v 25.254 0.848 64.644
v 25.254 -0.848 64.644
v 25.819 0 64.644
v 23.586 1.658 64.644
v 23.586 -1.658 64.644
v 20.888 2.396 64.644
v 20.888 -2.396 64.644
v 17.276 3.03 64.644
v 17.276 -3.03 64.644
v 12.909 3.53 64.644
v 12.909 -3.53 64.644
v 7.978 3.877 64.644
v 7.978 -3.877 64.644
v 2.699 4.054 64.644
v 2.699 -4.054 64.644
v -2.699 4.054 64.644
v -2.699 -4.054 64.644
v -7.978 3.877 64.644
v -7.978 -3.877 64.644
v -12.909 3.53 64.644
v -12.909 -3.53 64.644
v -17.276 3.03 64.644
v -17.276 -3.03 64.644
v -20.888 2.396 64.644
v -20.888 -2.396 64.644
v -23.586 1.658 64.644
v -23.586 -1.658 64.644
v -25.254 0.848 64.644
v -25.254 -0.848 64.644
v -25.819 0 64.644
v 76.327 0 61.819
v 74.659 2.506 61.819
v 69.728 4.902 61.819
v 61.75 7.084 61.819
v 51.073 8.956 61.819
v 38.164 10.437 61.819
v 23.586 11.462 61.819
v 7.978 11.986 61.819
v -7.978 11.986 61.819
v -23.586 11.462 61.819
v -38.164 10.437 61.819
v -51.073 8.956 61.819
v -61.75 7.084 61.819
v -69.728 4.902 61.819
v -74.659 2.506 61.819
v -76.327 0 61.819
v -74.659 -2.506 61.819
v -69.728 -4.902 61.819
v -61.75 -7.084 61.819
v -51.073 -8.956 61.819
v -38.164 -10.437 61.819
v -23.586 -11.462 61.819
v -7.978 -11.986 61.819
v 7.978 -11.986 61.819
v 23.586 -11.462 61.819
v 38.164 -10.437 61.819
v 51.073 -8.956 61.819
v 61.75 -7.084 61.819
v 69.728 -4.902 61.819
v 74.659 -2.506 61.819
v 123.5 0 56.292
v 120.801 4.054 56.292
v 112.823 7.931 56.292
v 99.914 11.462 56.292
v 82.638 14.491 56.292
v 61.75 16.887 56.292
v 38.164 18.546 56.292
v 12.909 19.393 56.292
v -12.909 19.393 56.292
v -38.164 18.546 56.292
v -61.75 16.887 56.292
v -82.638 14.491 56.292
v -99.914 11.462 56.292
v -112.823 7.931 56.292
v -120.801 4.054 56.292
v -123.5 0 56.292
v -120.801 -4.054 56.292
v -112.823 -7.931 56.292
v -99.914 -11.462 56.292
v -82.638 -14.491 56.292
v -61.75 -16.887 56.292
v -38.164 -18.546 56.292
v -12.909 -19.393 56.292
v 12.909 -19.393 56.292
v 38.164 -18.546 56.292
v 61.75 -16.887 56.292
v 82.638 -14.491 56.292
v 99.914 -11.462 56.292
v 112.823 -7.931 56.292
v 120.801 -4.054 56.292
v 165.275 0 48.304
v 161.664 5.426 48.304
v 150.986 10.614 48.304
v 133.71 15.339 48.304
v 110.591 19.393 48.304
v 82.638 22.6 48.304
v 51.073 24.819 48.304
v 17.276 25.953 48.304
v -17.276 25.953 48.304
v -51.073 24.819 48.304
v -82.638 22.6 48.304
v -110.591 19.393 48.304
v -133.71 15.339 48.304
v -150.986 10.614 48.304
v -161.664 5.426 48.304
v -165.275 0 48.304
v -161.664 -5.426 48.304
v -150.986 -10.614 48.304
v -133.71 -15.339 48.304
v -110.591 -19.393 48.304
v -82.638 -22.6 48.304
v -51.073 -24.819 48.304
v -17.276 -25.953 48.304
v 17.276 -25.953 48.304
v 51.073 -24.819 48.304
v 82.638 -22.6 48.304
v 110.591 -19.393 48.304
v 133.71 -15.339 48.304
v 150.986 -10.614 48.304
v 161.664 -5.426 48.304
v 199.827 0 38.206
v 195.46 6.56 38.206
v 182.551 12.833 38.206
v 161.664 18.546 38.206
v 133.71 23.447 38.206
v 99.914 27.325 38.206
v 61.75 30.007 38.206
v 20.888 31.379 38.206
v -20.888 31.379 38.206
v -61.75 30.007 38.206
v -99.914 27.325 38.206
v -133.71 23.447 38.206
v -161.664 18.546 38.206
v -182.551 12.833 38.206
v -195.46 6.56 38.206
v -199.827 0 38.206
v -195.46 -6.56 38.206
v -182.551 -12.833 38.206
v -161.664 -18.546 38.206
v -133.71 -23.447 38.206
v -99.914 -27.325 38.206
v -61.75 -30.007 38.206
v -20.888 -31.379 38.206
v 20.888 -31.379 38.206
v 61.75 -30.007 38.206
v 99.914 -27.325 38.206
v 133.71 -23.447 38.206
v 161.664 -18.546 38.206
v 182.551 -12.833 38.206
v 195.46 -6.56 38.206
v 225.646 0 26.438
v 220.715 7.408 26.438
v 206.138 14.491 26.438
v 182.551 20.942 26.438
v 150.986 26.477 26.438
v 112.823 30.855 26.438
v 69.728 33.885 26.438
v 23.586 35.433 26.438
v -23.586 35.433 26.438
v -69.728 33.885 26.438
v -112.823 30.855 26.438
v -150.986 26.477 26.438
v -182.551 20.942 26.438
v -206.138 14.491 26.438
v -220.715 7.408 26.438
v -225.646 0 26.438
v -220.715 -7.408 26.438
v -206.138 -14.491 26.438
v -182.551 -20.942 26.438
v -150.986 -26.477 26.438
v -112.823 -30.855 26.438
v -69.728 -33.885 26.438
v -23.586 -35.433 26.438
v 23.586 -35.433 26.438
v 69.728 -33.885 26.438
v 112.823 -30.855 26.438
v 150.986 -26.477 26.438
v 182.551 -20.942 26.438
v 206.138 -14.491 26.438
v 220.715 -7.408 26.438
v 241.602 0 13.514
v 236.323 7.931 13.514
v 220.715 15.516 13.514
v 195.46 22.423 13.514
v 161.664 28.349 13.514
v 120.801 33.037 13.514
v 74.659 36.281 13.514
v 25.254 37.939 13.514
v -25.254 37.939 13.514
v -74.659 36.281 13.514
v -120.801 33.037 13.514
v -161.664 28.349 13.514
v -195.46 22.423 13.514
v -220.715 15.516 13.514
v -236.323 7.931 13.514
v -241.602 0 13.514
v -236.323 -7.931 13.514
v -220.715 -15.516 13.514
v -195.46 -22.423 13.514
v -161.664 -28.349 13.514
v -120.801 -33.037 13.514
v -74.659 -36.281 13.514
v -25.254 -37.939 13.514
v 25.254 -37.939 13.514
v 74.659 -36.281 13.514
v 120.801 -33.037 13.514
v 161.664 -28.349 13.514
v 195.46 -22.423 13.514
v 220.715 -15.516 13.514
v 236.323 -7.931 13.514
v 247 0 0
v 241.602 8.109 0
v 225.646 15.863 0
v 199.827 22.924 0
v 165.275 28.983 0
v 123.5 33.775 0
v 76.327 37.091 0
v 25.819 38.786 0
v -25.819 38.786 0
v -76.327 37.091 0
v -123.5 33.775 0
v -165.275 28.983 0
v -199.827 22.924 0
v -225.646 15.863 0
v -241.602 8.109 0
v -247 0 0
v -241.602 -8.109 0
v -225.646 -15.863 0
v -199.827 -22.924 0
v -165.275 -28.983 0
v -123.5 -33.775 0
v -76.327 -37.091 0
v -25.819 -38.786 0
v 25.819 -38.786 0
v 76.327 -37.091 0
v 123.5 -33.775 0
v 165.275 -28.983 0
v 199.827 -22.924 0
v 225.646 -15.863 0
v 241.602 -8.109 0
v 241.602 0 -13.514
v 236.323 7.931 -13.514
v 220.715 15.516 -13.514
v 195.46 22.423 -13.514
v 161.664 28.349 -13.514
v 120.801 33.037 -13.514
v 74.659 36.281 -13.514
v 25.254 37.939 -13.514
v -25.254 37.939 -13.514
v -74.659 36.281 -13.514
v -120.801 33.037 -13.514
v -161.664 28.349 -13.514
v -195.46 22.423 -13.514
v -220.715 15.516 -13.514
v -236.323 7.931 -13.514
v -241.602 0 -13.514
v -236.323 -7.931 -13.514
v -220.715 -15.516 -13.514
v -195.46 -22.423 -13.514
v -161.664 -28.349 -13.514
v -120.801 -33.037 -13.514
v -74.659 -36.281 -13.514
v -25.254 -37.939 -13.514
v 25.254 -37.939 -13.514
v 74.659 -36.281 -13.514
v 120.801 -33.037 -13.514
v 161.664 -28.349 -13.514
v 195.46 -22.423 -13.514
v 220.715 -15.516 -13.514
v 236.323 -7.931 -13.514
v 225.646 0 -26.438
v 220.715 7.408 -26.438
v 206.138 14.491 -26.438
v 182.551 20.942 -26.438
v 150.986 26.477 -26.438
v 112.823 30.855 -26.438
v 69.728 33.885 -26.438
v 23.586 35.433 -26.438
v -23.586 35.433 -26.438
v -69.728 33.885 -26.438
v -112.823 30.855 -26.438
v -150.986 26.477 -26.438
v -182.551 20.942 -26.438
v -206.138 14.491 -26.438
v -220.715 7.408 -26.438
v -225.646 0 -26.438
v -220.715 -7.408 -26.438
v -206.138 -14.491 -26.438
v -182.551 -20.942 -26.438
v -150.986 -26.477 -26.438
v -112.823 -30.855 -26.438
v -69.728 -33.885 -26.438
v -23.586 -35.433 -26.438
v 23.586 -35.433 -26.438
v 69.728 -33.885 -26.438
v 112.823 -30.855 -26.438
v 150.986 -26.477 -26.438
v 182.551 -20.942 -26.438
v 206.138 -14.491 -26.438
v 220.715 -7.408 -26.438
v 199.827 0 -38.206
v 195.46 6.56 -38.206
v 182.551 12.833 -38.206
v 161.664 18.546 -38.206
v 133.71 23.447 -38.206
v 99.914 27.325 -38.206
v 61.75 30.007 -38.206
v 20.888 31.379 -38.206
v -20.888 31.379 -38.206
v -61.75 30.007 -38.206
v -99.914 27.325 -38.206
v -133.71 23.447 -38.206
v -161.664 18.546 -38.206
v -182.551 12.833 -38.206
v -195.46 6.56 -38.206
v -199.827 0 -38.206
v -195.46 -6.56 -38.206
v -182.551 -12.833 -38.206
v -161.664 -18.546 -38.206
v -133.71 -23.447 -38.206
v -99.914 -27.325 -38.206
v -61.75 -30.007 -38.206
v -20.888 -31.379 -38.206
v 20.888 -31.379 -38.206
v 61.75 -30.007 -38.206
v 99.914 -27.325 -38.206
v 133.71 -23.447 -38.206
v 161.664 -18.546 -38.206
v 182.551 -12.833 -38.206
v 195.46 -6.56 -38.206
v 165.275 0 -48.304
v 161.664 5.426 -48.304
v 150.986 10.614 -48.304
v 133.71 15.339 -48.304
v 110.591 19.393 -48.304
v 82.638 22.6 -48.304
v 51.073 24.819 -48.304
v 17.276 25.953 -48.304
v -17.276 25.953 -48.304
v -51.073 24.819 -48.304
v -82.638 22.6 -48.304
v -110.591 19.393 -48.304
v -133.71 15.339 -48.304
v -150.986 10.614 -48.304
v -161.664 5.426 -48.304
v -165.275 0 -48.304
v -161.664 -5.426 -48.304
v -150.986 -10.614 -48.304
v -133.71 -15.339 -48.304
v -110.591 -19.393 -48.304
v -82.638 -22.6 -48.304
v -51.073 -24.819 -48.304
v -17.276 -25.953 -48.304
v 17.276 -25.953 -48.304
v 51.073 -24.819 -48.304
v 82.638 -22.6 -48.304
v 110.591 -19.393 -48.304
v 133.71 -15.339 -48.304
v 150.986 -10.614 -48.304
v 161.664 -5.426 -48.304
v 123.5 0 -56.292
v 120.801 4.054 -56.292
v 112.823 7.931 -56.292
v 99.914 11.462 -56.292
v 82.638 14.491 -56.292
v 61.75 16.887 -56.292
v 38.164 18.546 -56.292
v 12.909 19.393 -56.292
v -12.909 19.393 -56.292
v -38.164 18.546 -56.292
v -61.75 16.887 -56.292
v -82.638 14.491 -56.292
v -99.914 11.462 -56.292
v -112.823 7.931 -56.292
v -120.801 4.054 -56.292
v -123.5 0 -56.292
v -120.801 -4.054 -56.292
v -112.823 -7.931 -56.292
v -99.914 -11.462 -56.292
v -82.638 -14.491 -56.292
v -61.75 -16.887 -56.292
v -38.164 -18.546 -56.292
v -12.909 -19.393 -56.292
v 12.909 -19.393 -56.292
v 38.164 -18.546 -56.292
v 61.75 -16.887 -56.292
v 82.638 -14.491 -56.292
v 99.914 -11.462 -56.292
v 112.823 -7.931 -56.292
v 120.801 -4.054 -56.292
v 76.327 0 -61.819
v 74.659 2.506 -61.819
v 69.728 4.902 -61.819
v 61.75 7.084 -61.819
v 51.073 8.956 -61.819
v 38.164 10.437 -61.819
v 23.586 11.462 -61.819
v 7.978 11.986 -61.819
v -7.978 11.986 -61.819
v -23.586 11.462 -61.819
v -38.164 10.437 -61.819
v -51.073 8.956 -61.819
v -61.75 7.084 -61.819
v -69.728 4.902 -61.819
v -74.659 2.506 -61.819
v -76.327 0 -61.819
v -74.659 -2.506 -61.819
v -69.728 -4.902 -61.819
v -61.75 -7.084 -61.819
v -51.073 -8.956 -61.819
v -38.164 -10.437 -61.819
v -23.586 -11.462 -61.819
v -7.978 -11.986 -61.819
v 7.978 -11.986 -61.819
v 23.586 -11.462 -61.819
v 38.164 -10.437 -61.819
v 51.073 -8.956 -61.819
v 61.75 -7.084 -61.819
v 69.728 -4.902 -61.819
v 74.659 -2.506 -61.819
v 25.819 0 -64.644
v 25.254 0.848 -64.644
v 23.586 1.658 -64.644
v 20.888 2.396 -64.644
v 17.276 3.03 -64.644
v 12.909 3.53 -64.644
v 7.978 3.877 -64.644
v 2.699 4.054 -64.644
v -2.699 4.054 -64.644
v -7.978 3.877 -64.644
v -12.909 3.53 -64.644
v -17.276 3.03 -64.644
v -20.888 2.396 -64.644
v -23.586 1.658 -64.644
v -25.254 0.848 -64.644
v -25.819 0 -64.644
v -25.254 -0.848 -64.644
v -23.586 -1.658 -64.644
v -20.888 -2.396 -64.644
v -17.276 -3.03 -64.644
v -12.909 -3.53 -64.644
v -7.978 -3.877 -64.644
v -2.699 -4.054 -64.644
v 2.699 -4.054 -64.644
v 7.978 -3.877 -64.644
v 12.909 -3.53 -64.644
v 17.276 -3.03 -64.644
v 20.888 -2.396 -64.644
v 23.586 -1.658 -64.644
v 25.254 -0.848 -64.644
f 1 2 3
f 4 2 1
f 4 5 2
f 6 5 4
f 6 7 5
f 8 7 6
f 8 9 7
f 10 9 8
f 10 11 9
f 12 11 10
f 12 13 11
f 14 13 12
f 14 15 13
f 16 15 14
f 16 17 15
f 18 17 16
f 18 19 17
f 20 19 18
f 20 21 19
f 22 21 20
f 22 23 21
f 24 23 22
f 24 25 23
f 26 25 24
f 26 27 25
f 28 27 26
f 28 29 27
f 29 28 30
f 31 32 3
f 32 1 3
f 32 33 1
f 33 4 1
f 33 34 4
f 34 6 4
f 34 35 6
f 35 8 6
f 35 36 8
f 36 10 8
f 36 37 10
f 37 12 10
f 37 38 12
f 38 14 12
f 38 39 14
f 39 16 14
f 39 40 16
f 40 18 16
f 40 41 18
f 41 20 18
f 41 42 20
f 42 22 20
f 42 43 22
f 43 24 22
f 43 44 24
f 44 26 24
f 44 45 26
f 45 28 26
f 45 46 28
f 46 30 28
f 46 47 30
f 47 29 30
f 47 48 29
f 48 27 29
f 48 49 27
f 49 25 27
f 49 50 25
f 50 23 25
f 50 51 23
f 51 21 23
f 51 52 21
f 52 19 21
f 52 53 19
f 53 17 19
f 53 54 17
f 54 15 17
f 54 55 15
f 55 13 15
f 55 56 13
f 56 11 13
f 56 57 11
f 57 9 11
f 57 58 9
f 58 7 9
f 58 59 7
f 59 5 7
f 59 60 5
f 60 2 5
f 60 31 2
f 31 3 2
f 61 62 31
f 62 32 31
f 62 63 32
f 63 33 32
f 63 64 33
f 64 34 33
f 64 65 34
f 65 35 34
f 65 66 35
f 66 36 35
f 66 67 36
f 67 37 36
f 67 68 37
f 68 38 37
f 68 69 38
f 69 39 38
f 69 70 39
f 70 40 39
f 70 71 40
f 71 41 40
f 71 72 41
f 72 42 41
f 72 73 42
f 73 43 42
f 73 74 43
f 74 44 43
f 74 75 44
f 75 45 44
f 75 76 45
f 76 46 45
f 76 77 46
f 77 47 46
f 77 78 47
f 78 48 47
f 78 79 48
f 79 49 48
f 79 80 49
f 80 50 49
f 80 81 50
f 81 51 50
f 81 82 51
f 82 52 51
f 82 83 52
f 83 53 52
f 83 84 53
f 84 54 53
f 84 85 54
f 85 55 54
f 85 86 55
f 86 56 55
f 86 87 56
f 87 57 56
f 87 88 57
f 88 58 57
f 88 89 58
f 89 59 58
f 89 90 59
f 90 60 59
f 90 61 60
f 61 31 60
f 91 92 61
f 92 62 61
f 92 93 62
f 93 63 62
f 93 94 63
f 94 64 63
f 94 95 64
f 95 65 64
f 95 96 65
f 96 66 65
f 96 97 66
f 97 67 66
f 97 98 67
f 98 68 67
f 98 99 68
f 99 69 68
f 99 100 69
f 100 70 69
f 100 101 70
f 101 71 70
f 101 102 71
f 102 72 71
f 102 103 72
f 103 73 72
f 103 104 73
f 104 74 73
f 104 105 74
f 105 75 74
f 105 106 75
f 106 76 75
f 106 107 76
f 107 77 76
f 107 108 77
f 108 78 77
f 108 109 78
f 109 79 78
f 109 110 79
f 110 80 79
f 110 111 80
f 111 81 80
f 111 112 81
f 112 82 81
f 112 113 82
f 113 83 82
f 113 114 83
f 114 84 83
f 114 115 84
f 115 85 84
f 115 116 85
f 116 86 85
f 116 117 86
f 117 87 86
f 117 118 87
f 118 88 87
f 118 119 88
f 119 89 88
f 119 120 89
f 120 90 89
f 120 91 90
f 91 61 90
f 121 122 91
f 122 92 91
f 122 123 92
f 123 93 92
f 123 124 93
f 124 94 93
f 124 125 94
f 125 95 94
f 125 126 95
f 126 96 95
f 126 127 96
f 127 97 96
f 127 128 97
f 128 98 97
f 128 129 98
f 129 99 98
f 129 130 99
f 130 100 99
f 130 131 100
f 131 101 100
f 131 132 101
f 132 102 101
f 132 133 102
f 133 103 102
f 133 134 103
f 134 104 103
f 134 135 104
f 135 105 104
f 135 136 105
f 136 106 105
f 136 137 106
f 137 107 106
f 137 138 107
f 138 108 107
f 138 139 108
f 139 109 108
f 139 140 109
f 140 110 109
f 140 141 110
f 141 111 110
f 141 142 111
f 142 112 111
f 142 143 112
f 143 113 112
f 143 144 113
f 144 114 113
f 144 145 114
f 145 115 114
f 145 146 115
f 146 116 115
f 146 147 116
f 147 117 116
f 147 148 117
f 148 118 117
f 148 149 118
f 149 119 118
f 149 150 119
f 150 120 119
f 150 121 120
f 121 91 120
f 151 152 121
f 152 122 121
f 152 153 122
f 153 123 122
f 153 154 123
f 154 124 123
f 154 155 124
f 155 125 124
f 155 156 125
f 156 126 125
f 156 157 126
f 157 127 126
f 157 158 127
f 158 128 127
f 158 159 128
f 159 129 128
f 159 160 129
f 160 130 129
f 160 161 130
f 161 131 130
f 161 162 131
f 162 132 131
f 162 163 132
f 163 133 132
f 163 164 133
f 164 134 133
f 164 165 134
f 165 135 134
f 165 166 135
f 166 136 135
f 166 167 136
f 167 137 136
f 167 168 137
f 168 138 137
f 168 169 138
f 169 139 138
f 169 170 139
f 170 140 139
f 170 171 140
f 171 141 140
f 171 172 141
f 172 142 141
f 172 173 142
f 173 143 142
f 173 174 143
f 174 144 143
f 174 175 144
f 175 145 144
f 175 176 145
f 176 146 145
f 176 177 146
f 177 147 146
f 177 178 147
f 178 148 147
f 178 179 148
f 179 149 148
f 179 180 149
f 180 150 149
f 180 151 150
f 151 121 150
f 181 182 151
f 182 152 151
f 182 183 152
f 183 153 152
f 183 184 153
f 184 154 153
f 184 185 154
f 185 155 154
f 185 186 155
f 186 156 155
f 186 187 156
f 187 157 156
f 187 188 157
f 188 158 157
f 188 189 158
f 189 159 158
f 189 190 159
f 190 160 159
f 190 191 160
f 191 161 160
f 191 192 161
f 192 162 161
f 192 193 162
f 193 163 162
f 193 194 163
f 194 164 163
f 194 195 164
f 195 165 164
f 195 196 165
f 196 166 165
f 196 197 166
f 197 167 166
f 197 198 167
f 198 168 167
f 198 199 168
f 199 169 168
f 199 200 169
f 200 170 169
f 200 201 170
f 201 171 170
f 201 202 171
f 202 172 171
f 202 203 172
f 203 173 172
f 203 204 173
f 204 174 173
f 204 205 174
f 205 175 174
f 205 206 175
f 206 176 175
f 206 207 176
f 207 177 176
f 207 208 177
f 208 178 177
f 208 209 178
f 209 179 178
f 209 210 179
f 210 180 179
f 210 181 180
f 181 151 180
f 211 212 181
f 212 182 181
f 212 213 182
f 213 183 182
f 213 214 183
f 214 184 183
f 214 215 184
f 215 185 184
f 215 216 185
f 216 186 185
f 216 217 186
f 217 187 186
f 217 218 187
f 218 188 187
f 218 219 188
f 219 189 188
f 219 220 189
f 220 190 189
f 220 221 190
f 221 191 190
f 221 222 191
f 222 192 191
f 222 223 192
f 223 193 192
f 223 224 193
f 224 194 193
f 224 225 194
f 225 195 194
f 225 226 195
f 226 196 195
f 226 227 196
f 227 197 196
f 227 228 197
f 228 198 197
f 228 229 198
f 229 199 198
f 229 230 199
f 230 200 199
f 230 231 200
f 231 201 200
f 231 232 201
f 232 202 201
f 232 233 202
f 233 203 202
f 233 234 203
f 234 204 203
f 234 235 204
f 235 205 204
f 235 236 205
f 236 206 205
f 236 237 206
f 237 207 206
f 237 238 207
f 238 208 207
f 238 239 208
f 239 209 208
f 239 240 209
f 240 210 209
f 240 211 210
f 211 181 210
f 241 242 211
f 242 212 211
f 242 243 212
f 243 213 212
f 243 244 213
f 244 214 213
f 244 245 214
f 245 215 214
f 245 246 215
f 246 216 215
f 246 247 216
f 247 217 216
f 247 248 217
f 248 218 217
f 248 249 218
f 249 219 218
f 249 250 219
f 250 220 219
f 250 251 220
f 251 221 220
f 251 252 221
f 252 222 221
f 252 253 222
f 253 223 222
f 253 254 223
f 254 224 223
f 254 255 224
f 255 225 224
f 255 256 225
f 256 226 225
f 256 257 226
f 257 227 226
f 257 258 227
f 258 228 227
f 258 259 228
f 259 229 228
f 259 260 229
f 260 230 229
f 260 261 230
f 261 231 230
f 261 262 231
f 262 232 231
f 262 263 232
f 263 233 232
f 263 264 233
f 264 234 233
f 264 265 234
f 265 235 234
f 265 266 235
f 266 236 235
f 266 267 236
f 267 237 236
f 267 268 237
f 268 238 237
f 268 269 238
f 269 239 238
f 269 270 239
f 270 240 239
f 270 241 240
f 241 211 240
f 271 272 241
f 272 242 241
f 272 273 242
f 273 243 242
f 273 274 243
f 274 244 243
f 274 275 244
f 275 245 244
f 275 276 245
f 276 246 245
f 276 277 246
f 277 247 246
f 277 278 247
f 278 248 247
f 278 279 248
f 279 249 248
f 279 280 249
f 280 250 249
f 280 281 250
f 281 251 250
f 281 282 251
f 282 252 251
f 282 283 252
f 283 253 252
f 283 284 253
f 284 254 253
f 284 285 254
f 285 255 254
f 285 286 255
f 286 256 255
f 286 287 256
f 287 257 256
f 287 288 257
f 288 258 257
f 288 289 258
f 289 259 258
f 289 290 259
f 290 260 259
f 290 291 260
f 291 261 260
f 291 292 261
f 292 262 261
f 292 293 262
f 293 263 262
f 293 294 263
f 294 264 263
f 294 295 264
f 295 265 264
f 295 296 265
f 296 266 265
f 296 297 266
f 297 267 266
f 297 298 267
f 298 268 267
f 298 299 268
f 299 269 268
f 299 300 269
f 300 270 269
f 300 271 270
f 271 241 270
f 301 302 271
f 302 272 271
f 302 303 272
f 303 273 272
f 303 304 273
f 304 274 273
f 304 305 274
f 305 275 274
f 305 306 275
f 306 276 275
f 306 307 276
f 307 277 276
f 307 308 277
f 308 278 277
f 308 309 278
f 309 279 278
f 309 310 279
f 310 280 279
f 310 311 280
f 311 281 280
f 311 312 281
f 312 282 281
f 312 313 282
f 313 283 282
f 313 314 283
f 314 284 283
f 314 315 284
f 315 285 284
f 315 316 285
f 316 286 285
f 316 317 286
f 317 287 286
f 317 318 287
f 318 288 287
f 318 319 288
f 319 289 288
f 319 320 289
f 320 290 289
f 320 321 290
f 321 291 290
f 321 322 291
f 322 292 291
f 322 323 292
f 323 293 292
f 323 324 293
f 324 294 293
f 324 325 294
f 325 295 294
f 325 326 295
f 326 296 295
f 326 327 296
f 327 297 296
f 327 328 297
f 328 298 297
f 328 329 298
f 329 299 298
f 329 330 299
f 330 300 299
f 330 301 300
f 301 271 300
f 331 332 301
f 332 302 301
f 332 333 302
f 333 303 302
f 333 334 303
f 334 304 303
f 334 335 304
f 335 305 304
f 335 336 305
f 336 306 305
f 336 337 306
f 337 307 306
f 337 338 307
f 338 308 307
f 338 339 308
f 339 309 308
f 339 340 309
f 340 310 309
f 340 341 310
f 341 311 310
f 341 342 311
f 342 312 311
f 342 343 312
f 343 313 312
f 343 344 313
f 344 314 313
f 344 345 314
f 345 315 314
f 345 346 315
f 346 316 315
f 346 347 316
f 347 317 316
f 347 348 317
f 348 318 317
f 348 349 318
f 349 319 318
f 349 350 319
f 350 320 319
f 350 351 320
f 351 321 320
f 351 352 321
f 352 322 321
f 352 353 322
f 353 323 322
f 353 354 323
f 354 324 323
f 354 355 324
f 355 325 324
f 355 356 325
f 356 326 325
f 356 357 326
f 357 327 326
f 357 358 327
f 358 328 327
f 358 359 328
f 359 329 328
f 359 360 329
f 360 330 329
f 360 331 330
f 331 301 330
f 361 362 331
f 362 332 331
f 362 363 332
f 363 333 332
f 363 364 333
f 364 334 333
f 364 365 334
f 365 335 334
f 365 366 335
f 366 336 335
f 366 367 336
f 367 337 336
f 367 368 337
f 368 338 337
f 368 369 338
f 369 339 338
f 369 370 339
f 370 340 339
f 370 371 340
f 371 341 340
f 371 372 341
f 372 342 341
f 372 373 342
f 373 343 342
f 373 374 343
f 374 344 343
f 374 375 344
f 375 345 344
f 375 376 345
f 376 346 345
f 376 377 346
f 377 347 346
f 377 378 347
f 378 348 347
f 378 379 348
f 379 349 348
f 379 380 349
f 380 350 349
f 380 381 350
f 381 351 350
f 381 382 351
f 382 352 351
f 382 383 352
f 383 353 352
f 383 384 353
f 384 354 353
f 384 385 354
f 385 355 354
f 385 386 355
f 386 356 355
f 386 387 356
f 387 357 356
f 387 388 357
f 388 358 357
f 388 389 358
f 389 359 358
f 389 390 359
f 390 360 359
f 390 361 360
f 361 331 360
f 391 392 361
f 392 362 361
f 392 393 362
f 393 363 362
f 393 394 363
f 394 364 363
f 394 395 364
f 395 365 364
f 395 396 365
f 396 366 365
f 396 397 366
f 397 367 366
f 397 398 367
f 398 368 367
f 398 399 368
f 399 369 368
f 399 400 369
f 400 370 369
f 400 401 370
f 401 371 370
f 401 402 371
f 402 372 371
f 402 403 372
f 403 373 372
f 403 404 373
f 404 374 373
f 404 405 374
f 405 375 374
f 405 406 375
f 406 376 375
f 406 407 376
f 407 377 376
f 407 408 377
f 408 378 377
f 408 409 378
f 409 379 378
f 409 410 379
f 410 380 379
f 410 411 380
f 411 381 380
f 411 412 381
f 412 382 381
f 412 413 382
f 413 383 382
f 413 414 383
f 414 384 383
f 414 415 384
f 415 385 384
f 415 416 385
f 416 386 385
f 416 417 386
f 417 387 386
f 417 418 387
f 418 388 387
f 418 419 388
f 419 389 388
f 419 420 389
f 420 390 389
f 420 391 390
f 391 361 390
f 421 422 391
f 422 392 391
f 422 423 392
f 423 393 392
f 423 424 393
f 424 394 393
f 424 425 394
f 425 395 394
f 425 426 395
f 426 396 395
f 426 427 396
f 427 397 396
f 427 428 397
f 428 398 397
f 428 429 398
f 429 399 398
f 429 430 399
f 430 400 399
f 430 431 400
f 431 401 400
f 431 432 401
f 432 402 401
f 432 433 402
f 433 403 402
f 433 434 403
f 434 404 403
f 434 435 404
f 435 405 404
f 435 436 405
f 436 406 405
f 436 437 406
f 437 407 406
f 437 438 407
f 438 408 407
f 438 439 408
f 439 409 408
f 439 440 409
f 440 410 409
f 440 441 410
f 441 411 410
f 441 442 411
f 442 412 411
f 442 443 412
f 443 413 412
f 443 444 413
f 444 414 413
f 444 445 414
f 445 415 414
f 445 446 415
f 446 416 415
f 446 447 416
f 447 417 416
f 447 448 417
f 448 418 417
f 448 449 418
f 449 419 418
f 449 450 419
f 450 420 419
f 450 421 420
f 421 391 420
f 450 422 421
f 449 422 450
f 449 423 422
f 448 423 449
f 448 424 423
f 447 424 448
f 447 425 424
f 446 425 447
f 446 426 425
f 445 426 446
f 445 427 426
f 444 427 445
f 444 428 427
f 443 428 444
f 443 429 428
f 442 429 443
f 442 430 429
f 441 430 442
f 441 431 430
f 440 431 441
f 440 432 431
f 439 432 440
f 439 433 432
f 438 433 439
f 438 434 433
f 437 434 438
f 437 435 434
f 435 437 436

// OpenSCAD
// Generated by SolidPython 1.0.1 on 2020-07-29 00:46:53


scale(v = [19, 3, 5]) {
	sphere(r = 13);
}
/***********************************************
*********      SolidPython code:      **********
************************************************
 
# import packages: SolidPython
from solid import *
from solid.utils import *
from itertools import chain, combinations, permutations


class Resize:

    def __init__(self, scad_file):
        self.scad_file = scad_file
        #self.scad_file = import_scad(scad_file)
        # cone/cylinder param:
        self.r1 = 0
        self.r2 = 0
        self.h = 0
        # rectangular prism param:
        self.w = 0
        self.l = 0
        # ellipse param:
        self.r = 0

    # import OpenScad code (file name corresponds to shape)


    # classify shape + parameters
    def assign(self, param1, param2, param3):
        if self.scad_file == 'cone.scad':
            self.r1 = param1
            self.r2 = param2
            self.h = param3
        elif self.scad_file == 'cylinder.scad':
            self.r1 = param1
            self.r2 = param2
            self.h = param3
        elif self.scad_file == 'rectangularPrism.scad':
            self.h = param1
            self.l = param2
            self.w = param3
        else:
            self.r = param1
            self.h = param2

    # resize parameters
    def iterate(self):
        x = range(3, 20, 2)
        i = 1
        if self.scad_file == 'cone.scad':
            tempList = list(permutations(x, 2))
            for temp in tempList:
                param1 = temp[0]
                param2 = temp[1]
                filepath = 'produced_scad_files/' + 'cone' + str(param1) + '_' + str(param2) + '_' + '.scad'
                scad_render_to_file(cylinder(h=param1, r1=param2, r2=0), filepath)

        elif self.scad_file == 'cylinder.scad':
            tempList = list(permutations(x, 3))
            for temp in tempList:
                param1 = temp[0]
                param2 = temp[1]
                filepath = 'produced_scad_files/' + 'cylinder' + str(param1) + '_' + str(param2) + '_' + '.scad'
                scad_render_to_file(cylinder(h=param1, r1=param2, r2=param2), filepath)

        elif self.scad_file == 'rectangularPrism.scad':
            tempList = list(permutations(x, 3))
            for temp in tempList:
                param1 = temp[0]
                param2 = temp[1]
                param3 = temp[2]
                filepath = 'produced_scad_files/' + 'rectangularPrism' + str(param1) + '_' + str(param2) + '_' + str(
                    param3) + '.scad'
                scad_render_to_file(cube(size=(param1, param2, param3)), filepath)

        elif self.scad_file == 'ellipse.scad':
            tempList = list(permutations(x, 4))
            for temp in tempList:
                param1 = temp[0]
                param2 = temp[1]
                param3 = temp[2]
                param4 = temp[3]
                filepath = 'produced_scad_files/' + 'ellipse' + str(param1) + '_' + str(param2) + '_' + str(param3) + '_' + str(param4) + '.scad'
                scad_render_to_file(scale([param1, param2, param3])(sphere(r=param4)), filepath)

    def render_to_scadfile(self):
        scad_render_to_file(scad, 'example.scad') 
 
************************************************/
